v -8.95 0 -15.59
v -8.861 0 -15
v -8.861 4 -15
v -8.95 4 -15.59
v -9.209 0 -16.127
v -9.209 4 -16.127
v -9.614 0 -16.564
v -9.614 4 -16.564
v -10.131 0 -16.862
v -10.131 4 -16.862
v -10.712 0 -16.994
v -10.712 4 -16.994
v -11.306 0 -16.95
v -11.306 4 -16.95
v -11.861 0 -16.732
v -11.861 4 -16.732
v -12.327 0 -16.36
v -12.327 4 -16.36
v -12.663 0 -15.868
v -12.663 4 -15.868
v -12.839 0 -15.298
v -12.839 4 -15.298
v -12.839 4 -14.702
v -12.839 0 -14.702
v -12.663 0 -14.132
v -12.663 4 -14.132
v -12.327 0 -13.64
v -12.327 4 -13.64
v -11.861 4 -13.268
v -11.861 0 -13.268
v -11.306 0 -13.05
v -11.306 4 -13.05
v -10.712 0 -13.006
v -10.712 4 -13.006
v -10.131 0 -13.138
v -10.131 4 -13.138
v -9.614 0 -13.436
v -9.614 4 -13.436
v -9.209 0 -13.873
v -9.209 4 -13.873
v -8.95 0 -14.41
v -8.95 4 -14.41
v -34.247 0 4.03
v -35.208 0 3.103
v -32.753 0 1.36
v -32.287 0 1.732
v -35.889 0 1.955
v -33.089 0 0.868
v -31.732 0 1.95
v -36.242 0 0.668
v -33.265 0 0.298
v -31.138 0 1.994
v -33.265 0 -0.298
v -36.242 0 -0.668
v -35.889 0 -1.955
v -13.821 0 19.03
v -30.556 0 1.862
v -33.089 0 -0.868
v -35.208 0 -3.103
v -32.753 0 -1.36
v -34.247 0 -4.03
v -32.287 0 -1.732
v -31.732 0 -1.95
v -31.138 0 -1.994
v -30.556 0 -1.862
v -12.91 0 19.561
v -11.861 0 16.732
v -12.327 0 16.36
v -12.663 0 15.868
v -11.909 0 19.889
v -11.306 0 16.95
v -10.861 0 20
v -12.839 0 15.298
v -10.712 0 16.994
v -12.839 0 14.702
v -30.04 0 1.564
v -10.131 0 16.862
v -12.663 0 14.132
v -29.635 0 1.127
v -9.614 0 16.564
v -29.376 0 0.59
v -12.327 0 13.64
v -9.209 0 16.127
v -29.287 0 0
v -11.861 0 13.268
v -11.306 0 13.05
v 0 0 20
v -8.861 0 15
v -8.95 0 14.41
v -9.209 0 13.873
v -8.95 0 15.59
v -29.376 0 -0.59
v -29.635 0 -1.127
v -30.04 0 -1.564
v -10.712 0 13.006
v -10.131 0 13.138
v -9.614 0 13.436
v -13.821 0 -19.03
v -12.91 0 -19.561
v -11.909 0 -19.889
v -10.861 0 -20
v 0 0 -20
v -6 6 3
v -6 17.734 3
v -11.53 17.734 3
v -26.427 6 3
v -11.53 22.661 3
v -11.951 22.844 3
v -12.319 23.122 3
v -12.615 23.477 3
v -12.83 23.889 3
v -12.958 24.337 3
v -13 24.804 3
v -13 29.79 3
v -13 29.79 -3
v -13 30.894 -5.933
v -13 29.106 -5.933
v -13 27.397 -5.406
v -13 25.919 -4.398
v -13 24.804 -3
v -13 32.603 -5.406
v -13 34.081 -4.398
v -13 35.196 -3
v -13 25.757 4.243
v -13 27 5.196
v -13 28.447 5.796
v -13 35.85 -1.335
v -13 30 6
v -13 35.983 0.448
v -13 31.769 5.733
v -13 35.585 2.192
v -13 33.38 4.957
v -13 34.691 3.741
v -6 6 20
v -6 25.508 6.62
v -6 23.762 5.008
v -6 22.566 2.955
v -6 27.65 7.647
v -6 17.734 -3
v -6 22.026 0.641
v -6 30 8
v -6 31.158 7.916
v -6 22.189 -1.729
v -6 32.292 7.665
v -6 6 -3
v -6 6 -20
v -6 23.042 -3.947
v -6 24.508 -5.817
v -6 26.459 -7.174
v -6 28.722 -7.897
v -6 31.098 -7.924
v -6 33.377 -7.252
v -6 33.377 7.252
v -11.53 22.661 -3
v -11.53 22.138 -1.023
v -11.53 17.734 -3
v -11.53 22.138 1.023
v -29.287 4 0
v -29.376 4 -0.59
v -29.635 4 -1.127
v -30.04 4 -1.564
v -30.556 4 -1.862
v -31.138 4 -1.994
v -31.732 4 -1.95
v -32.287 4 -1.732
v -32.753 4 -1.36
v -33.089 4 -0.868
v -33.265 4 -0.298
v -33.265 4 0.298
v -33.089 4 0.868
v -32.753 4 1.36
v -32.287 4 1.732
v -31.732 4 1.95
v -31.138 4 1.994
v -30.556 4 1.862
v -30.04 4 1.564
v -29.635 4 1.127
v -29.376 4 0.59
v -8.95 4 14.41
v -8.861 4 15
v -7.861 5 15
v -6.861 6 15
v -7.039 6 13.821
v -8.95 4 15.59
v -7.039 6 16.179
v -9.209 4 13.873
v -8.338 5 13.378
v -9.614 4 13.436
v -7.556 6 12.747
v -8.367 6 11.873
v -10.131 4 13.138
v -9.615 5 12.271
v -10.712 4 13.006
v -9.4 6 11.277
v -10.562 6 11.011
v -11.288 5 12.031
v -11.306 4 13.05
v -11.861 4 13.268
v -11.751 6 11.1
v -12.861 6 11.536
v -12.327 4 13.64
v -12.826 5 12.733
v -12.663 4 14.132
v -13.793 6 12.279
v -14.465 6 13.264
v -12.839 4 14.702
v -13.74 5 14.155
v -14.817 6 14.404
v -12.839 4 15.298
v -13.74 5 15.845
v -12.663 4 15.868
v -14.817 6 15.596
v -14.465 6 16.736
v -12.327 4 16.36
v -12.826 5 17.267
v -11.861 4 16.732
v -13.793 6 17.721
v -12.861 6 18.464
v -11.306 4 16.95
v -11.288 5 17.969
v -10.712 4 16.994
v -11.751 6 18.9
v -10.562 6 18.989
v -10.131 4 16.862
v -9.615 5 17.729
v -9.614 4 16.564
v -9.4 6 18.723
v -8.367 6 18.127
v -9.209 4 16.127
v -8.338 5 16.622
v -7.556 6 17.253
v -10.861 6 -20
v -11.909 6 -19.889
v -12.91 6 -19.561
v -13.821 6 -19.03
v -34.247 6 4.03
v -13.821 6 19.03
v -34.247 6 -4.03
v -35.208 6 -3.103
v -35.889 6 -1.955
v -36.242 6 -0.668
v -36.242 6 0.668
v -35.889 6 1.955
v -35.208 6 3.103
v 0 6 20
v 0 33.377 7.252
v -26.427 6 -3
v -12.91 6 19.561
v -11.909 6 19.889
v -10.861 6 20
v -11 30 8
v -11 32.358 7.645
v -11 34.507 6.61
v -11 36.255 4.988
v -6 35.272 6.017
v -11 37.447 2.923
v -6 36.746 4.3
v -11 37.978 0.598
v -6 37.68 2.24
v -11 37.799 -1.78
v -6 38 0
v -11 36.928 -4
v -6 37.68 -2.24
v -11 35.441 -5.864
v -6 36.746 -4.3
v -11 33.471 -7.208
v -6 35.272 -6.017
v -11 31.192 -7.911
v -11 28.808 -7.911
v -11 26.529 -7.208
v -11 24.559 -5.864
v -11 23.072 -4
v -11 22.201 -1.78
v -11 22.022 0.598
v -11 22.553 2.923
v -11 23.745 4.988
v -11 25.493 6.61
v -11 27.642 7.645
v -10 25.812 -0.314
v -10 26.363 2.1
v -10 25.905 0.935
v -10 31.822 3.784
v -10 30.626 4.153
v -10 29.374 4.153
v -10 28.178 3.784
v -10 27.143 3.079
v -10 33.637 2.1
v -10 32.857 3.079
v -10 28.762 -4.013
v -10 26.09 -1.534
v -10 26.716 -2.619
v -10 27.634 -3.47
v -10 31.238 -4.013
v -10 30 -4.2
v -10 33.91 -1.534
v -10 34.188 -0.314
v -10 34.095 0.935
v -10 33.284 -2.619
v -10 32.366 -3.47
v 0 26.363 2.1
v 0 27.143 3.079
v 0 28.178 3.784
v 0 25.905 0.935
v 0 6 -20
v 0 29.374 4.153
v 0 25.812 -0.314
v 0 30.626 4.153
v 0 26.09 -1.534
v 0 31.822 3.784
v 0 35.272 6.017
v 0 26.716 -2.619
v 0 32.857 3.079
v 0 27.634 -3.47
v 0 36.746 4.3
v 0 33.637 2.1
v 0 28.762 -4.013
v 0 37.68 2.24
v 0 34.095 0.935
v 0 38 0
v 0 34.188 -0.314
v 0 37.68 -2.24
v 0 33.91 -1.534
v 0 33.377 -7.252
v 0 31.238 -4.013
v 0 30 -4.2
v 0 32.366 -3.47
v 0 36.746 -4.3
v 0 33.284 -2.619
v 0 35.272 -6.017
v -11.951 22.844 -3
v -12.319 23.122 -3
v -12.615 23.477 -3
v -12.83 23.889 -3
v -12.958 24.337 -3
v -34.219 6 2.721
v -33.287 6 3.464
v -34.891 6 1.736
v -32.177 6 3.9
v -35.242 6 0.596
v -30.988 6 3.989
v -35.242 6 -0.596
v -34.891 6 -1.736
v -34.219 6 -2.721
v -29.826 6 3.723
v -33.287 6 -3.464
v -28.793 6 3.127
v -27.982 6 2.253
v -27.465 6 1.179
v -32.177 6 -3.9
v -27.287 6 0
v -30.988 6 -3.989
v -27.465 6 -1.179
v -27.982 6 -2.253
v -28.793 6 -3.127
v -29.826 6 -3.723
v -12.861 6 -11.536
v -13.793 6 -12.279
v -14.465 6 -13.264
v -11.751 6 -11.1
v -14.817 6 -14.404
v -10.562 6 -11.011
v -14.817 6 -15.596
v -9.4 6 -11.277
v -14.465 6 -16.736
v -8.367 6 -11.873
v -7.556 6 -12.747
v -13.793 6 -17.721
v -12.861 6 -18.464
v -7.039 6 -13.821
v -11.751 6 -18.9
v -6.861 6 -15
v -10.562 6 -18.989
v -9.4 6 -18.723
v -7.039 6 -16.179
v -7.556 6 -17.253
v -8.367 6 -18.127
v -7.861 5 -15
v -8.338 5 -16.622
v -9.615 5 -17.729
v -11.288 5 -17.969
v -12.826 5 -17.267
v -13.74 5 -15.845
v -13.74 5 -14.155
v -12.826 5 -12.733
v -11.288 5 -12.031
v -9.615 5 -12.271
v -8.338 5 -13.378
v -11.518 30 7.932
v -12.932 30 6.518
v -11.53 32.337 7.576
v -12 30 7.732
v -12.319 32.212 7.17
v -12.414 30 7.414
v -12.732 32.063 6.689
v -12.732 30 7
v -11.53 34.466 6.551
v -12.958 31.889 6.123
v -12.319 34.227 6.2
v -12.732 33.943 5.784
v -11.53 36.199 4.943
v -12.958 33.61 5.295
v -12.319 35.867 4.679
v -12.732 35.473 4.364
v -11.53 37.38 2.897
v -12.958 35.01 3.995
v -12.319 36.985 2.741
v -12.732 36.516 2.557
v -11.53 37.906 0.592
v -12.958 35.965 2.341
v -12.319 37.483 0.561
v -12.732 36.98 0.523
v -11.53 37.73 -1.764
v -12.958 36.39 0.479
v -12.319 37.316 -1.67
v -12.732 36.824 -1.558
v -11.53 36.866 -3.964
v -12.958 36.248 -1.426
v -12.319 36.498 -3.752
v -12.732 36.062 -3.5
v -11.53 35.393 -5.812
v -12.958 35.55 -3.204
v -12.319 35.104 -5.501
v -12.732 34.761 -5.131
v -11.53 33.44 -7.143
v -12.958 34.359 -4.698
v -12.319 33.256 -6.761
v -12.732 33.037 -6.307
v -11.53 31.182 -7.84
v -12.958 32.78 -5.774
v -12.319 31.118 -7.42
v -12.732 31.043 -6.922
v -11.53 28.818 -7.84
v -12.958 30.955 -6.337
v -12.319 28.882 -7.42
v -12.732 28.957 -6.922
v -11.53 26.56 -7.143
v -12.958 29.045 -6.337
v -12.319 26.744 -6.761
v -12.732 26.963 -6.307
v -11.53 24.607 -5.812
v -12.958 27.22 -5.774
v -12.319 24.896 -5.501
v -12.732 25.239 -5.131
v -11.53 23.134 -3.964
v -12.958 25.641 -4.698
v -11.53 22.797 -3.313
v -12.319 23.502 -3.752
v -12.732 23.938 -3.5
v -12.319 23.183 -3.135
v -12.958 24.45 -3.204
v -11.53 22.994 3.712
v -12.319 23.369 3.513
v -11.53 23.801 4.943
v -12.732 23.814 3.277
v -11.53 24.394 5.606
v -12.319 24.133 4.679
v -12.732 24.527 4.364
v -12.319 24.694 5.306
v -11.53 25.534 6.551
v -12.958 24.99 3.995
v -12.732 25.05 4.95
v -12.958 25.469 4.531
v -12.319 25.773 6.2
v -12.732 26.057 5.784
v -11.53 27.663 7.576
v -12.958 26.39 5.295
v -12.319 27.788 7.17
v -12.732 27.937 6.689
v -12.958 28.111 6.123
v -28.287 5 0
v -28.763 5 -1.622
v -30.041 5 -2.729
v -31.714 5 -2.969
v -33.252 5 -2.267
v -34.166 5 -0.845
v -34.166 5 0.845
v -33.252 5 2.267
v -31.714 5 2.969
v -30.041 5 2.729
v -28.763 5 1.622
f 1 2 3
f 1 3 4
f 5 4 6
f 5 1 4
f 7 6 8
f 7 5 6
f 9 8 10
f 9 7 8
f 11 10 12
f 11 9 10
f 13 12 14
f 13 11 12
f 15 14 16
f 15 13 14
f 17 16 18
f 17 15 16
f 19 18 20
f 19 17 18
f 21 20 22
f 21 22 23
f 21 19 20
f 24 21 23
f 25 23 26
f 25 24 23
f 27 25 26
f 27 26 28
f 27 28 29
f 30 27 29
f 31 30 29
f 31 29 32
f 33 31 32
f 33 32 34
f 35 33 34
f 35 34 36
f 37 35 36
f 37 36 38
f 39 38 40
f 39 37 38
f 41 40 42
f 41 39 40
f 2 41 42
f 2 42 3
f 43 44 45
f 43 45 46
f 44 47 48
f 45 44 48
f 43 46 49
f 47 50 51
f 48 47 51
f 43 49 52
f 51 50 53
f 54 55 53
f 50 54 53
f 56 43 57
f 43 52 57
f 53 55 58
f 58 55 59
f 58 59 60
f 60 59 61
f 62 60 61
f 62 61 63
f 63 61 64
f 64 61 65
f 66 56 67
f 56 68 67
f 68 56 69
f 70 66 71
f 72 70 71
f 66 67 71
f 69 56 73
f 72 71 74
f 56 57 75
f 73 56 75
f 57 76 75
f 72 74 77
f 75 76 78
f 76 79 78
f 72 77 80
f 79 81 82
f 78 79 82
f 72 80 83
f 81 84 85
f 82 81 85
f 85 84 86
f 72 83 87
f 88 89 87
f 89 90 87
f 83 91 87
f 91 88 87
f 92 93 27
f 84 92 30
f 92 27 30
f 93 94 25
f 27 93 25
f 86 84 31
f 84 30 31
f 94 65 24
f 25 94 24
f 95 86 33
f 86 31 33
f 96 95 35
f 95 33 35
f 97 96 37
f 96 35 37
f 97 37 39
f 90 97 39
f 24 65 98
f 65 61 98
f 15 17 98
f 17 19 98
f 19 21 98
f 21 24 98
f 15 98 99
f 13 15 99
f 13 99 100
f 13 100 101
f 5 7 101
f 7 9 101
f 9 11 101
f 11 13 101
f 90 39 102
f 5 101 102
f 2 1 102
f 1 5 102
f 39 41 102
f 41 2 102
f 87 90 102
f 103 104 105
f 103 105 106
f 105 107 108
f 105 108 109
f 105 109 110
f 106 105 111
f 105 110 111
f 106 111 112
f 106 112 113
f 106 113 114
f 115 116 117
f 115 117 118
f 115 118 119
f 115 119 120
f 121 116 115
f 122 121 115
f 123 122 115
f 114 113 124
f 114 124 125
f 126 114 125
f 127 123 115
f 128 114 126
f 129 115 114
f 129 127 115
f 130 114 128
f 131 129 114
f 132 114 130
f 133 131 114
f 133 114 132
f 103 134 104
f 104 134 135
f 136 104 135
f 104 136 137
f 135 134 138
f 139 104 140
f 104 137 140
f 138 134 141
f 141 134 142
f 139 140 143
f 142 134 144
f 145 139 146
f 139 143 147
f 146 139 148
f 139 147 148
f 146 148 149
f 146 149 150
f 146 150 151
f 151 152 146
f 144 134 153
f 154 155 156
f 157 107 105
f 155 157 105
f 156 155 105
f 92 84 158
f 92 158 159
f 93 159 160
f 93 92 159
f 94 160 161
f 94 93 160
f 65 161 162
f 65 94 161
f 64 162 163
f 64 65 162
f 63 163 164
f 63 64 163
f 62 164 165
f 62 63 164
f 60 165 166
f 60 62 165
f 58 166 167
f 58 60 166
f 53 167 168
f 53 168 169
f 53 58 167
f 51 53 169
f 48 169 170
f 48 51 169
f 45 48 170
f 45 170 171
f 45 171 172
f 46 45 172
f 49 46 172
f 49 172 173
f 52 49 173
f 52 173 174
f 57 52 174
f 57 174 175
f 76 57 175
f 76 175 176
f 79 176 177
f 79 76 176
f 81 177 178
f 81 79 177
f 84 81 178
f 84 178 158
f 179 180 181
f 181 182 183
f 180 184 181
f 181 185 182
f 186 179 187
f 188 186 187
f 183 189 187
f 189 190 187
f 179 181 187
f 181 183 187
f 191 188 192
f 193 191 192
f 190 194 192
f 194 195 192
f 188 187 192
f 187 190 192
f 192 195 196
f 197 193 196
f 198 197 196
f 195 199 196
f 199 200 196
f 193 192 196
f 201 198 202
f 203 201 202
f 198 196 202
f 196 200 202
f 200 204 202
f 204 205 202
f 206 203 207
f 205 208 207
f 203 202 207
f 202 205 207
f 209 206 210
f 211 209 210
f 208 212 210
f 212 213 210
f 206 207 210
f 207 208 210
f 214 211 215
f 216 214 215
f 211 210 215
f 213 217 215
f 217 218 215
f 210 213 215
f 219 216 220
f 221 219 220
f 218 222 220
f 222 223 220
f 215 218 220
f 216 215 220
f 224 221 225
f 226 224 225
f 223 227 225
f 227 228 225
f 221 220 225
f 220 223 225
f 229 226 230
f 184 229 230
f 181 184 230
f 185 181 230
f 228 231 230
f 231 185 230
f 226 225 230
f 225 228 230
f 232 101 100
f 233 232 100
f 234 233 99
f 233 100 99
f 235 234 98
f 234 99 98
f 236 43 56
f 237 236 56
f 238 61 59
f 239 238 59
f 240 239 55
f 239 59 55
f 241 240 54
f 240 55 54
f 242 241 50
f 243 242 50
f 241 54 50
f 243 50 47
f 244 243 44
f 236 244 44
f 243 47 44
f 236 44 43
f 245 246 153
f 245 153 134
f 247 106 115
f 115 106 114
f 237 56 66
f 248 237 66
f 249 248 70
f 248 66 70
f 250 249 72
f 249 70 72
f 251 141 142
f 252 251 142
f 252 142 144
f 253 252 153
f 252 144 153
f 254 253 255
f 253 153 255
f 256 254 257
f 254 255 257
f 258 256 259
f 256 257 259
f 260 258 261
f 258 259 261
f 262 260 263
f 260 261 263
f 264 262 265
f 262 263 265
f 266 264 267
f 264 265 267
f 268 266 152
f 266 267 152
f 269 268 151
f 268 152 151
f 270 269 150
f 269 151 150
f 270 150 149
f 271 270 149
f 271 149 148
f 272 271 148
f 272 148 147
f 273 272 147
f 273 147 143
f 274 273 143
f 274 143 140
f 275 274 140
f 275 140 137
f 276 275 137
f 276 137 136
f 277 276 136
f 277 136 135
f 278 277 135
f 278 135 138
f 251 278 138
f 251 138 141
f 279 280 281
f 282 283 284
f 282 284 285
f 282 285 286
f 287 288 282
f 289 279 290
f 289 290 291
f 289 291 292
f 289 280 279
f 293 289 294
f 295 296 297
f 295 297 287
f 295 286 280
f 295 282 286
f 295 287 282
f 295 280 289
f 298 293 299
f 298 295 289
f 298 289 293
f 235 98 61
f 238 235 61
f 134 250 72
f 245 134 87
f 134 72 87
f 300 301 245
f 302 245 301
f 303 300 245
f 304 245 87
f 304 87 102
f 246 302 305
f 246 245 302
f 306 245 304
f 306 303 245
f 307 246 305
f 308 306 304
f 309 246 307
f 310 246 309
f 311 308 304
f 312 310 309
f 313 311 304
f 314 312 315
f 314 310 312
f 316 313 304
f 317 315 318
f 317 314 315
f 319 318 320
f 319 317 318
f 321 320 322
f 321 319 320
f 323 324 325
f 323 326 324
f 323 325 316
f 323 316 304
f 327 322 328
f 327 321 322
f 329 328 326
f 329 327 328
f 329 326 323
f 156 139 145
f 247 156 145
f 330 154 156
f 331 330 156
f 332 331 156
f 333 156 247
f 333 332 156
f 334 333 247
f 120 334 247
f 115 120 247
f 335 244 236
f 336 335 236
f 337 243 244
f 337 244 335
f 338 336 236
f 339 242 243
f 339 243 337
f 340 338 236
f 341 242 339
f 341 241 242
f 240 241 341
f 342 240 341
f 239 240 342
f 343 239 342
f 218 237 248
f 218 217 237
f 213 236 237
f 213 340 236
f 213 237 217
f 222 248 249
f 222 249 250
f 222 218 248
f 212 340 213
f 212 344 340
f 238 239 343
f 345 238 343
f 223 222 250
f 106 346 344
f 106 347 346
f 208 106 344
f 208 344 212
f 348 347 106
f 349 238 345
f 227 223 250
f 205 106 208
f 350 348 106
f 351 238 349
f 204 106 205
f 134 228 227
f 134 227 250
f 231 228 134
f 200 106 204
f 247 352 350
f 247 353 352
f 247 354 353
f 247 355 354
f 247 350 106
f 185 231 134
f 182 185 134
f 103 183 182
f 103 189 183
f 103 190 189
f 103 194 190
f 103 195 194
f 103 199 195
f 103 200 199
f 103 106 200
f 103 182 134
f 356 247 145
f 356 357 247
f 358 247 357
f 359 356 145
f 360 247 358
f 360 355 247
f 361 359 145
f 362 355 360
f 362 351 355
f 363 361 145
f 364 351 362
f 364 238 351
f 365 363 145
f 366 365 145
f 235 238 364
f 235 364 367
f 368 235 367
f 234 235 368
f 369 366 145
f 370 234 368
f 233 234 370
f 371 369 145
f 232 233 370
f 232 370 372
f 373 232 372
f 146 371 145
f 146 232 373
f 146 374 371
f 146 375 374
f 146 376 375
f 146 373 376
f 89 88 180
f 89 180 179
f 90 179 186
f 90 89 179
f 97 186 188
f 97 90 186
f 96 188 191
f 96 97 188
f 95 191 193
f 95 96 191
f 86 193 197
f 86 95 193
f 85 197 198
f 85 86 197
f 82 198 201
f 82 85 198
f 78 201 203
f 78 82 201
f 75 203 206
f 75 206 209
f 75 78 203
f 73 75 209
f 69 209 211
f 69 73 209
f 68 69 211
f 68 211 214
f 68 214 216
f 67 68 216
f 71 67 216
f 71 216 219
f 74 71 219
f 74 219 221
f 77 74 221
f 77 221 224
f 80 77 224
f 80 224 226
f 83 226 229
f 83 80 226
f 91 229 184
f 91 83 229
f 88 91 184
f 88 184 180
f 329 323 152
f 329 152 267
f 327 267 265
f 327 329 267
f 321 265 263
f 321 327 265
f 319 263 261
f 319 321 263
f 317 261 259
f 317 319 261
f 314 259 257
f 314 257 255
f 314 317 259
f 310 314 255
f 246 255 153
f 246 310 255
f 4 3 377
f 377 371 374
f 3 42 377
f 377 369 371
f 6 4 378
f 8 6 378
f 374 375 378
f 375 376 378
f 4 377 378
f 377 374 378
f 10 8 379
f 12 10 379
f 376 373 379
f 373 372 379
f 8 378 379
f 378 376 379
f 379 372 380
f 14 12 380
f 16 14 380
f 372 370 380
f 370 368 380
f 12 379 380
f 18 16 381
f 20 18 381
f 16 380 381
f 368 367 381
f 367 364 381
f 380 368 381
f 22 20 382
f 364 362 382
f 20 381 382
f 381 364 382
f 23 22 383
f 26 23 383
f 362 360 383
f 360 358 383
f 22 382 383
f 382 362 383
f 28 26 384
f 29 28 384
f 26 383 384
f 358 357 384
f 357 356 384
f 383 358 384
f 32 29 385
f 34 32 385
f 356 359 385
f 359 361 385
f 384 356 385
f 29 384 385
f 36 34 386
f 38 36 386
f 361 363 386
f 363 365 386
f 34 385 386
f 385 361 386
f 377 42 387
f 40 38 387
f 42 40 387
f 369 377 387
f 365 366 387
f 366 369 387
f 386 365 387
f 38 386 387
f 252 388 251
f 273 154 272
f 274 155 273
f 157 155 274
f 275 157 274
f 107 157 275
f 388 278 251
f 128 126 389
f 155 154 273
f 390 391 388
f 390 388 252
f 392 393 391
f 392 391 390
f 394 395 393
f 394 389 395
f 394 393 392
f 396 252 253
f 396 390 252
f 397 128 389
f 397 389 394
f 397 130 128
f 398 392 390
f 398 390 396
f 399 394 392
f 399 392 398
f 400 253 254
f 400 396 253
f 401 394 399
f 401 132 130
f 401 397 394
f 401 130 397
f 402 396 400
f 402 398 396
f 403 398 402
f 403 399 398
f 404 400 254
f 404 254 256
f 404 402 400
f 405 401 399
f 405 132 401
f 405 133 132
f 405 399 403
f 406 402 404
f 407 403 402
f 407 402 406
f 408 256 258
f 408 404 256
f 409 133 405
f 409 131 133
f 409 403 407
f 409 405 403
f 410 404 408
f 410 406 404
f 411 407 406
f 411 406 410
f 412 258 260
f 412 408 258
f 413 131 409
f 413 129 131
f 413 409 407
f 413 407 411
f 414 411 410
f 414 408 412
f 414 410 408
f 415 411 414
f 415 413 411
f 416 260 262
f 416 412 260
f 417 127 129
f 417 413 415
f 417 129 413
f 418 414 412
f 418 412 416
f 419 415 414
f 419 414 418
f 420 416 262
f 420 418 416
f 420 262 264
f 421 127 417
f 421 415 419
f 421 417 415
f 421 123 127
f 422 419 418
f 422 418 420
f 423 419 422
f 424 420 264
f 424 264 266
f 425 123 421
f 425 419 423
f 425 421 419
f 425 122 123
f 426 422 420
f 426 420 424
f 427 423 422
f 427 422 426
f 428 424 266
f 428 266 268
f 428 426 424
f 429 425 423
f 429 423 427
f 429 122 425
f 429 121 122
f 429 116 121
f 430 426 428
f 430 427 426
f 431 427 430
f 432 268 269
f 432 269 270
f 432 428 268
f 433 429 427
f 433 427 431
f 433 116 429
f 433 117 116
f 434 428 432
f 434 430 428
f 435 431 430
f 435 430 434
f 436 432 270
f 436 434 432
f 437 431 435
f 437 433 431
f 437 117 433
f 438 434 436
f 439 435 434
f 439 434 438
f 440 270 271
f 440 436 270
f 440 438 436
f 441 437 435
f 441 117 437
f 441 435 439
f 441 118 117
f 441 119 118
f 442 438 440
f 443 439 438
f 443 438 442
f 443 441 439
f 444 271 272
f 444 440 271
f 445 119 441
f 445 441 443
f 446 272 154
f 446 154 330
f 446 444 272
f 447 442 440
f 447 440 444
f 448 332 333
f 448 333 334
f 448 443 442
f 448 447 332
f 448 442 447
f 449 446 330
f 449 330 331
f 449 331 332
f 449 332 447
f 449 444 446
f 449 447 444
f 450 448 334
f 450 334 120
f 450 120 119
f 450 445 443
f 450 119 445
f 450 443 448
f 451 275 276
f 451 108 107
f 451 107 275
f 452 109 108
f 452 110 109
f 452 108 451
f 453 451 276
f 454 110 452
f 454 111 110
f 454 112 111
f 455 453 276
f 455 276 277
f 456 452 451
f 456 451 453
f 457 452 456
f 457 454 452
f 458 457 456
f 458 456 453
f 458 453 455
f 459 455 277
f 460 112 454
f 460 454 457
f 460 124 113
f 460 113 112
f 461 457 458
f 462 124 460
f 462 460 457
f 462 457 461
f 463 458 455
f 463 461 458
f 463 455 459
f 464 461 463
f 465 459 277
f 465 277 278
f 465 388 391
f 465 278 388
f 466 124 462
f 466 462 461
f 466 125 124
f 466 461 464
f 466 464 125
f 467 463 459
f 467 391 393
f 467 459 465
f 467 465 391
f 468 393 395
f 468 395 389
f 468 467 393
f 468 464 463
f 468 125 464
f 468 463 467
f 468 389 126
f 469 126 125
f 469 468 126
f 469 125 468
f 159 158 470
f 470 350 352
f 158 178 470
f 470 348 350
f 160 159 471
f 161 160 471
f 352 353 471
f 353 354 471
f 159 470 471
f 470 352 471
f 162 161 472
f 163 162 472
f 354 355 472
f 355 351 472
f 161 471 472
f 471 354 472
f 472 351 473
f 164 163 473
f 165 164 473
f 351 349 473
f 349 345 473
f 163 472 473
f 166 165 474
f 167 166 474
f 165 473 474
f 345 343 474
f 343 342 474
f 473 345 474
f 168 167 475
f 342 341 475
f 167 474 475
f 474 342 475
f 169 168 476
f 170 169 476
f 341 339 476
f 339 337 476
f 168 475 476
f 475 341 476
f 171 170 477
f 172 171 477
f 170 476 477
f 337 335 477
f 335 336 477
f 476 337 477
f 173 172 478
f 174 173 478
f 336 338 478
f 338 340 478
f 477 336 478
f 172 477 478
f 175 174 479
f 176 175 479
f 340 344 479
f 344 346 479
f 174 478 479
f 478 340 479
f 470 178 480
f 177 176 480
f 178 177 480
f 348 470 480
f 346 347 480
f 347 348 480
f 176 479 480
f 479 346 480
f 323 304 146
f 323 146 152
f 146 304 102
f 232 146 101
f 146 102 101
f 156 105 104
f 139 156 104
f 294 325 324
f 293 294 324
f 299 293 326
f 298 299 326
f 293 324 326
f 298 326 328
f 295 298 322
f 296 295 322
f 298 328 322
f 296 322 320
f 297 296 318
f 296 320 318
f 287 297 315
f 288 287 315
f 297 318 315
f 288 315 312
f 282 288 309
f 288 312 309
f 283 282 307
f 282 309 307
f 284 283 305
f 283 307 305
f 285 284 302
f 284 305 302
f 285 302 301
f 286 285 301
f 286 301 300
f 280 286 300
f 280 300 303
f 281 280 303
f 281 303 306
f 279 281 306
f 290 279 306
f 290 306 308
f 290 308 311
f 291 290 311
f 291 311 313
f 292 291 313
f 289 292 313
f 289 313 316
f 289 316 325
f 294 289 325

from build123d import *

# Parameters (mm, degrees)
SKETCH_1_R           = 2
EXTRUDE_1_DEPTH      = 6
CHAMFER_3_SIZE       = 2
SKETCH_4_R           = 4.2
EXTRUDE_2_DEPTH      = 6
SKETCH_7_R           = 8
EXTRUDE_3_DEPTH      = 7
FILLET_1_R           = 2
EXTRUDE_4_DEPTH      = 3
EXTRUDE_4_DEPTH_BACK = 3
SKETCH_9_R           = 4.2
CUT_EXTRUDE_1_DEPTH  = 10


with BuildPart() as part:
    # Эскиз1 → Бобышка-Вытянуть1 (new body)
    with BuildSketch(Plane(origin=(0, 0, 0), x_dir=(1, 0, 0), z_dir=(0, 1, 0))):
        with BuildLine():
            Line((0, -20), (0, 20))
            Line((0, 20), (-10.861288353, 20))
            ThreePointArc((-10.861288353, 20), (-12.418498887, 19.751325642), (-13.820814088, 19.030038141))
            Line((-13.820814088, 19.030038141), (-34.246577377, 4.030038141))
            ThreePointArc((-34.246577377, 4.030038141), (-36.287051642, 0), (-34.246577377, -4.030038141))
            Line((-34.246577377, -4.030038141), (-13.820814088, -19.030038141))
            ThreePointArc((-13.820814088, -19.030038141), (-12.418498887, -19.751325642), (-10.861288353, -20))
            Line((-10.861288353, -20), (0, -20))
        make_face()
        with Locations((-31.287051642, 0)):
            Circle(SKETCH_1_R, mode=Mode.SUBTRACT)
        with Locations((-10.861288353, -15)):
            Circle(SKETCH_1_R, mode=Mode.SUBTRACT)
        with Locations((-10.861288353, 15)):
            Circle(SKETCH_1_R, mode=Mode.SUBTRACT)
    extrude(amount=EXTRUDE_1_DEPTH)

    # Фаска3
    chamfer_3_edges = [part.edges().sort_by_distance(p)[0] for p in [
        (-12.861288353, 6, -15),
        (-33.287051642, 6, 0),
        (-12.861288353, 6, 15),
    ]]
    chamfer(chamfer_3_edges, length=CHAMFER_3_SIZE)

    # Эскиз4 → Бобышка-Вытянуть2 (add)
    with BuildSketch(Plane(origin=(0, 0, 0), x_dir=(0, 0, -1), z_dir=(1, 0, 0))):
        with BuildLine():
            Line((-7.252328736, 33.376940613), (-20, 6))
            Line((-20, 6), (20, 6))
            Line((20, 6), (7.252328736, 33.376940613))
            ThreePointArc((7.252328736, 33.376940613), (0, 38), (-7.252328736, 33.376940613))
        make_face()
        with Locations((0, 30)):
            Circle(SKETCH_4_R, mode=Mode.SUBTRACT)
    extrude(amount=-EXTRUDE_2_DEPTH)

    # Эскиз7 → Бобышка-Вытянуть3 (add)
    with BuildSketch(Plane.ZY.offset(6)):
        with Locations((0, 30)):
            Circle(SKETCH_7_R)
    extrude(amount=EXTRUDE_3_DEPTH)

    # Скругление1
    fillet_1_edges = [part.edges().sort_by_distance(p)[0] for p in [
        (-13, 30, -8),
    ]]
    fillet(fillet_1_edges, radius=FILLET_1_R)

    # Эскиз8 → Бобышка-Вытянуть4 (add, two sides)
    with BuildSketch(Plane.XY) as extrude_4_sk:
        Polygon((-26.427051642, 6), (-12.606919313, 30.486720465), (-11.530283794, 30.486720465), (-11.530283794, 17.734425211), (-4.808903741, 17.734425211), (-4.214748598, 6), align=None)
    extrude(amount=EXTRUDE_4_DEPTH)
    extrude(extrude_4_sk.sketch, amount=-EXTRUDE_4_DEPTH_BACK)

    # Эскиз9 → Вырез-Вытянуть1 (cut)
    with BuildSketch(Plane(origin=(0, 0, 0), x_dir=(0, 0, -1), z_dir=(1, 0, 0))):
        with Locations((0, 30)):
            Circle(SKETCH_9_R)
    extrude(amount=-CUT_EXTRUDE_1_DEPTH, mode=Mode.SUBTRACT)


solid = part.part
